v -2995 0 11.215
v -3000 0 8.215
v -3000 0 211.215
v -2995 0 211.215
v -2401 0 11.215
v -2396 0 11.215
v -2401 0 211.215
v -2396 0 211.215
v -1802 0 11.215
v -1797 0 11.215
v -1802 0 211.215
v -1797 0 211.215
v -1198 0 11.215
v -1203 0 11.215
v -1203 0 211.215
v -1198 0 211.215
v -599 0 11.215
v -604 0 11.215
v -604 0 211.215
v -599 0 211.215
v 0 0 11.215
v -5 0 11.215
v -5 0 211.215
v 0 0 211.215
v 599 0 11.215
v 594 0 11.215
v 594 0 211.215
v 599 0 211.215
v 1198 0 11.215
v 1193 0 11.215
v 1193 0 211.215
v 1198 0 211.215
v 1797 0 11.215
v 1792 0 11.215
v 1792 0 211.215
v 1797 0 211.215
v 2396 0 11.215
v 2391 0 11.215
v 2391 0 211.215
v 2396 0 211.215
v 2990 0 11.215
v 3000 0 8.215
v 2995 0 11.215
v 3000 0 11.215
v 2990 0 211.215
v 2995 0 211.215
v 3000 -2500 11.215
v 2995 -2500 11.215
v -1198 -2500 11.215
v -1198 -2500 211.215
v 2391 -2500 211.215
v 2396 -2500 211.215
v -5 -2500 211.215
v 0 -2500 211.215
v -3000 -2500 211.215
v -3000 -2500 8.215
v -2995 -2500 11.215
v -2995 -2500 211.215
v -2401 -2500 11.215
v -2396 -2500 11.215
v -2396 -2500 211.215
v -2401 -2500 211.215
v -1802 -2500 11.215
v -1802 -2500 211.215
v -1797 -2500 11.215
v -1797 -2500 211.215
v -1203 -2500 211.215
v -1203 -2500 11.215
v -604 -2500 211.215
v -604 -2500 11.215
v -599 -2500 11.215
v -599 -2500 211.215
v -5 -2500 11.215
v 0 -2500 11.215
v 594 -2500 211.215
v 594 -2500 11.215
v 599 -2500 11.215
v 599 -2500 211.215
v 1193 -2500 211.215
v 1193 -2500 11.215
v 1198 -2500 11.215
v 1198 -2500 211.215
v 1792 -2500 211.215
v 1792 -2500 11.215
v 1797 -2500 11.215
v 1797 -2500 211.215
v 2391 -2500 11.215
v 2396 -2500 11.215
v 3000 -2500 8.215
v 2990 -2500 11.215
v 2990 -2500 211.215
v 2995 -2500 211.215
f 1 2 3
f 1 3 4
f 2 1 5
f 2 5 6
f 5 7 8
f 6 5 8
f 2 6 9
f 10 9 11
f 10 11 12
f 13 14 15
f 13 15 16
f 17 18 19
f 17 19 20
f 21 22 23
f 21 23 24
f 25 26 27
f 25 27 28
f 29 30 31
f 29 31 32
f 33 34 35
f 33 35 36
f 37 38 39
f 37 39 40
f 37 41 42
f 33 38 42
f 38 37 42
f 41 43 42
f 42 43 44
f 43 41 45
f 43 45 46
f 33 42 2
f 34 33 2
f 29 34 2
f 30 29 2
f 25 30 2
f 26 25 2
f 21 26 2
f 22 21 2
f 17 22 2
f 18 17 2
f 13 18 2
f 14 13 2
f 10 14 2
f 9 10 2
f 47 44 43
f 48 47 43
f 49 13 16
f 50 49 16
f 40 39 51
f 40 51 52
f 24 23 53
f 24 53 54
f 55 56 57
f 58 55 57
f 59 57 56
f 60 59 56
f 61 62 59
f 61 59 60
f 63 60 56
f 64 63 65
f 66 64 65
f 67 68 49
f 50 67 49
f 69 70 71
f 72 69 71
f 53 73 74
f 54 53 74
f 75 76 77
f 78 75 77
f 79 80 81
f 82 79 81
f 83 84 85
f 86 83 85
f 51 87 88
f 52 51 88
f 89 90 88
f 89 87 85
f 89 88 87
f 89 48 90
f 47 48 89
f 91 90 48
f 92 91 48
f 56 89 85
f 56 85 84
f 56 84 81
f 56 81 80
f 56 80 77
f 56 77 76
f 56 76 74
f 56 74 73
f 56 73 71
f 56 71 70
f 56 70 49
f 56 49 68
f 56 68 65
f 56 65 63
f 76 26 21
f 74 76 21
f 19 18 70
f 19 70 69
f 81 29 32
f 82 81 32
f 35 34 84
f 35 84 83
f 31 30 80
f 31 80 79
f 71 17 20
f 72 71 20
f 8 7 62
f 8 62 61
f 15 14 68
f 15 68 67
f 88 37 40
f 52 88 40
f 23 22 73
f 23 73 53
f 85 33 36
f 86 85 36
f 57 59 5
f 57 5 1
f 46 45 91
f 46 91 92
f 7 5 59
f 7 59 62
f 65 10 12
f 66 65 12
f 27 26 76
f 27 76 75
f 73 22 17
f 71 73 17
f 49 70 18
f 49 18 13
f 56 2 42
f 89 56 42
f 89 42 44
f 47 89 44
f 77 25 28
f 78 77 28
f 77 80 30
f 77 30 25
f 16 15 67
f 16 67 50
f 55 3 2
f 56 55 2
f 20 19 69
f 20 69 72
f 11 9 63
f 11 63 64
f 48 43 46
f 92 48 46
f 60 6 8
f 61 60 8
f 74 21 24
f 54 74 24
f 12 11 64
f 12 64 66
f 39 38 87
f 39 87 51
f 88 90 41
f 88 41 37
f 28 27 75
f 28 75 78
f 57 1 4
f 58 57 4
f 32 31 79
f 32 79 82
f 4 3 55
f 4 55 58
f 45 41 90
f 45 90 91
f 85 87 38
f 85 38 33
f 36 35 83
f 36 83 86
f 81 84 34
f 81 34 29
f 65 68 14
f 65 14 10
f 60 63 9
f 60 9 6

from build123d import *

# Parameters (mm, degrees)
F0_W     = 5
F0_H     = 200
F1_DEPTH = 2500


with BuildPart() as f1:
    # F0 (on Front) → F1 (new body)
    with BuildSketch(Plane.XZ):
        with Locations((-2997.5, 111.214954)):
            Rectangle(F0_W, F0_H)
        Polygon((-2995, 11.214954), (-3000, 11.214954), (-3000, 8.214954), (-2401, 8.214954), (-1802, 8.214954), (-1203, 8.214954), (-604, 8.214954), (-5, 8.214954), (594, 8.214954), (1193, 8.214954), (1792, 8.214954), (2391, 8.214954), (3000, 8.214954), (3000, 11.214954), (2995, 11.214954), (2990, 11.214954), (2396, 11.214954), (2391, 11.214954), (1797, 11.214954), (1792, 11.214954), (1198, 11.214954), (1193, 11.214954), (599, 11.214954), (594, 11.214954), (0, 11.214954), (-5, 11.214954), (-599, 11.214954), (-604, 11.214954), (-1198, 11.214954), (-1203, 11.214954), (-1797, 11.214954), (-1802, 11.214954), (-2396, 11.214954), (-2401, 11.214954), align=None)
        with Locations((-2398.5, 111.214954)):
            Rectangle(F0_W, F0_H)
        with Locations((-1799.5, 111.214954)):
            Rectangle(F0_W, F0_H)
        with Locations((-1200.5, 111.214954)):
            Rectangle(F0_W, F0_H)
        with Locations((-601.5, 111.214954)):
            Rectangle(F0_W, F0_H)
        with Locations((-2.5, 111.214954)):
            Rectangle(F0_W, F0_H)
        with Locations((596.5, 111.214954)):
            Rectangle(F0_W, F0_H)
        with Locations((2992.5, 111.214954)):
            Rectangle(F0_W, F0_H)
        with Locations((1195.5, 111.214954)):
            Rectangle(F0_W, F0_H)
        with Locations((2393.5, 111.214954)):
            Rectangle(F0_W, F0_H)
        with Locations((1794.5, 111.214954)):
            Rectangle(F0_W, F0_H)
    extrude(amount=F1_DEPTH)


solid = f1.part
